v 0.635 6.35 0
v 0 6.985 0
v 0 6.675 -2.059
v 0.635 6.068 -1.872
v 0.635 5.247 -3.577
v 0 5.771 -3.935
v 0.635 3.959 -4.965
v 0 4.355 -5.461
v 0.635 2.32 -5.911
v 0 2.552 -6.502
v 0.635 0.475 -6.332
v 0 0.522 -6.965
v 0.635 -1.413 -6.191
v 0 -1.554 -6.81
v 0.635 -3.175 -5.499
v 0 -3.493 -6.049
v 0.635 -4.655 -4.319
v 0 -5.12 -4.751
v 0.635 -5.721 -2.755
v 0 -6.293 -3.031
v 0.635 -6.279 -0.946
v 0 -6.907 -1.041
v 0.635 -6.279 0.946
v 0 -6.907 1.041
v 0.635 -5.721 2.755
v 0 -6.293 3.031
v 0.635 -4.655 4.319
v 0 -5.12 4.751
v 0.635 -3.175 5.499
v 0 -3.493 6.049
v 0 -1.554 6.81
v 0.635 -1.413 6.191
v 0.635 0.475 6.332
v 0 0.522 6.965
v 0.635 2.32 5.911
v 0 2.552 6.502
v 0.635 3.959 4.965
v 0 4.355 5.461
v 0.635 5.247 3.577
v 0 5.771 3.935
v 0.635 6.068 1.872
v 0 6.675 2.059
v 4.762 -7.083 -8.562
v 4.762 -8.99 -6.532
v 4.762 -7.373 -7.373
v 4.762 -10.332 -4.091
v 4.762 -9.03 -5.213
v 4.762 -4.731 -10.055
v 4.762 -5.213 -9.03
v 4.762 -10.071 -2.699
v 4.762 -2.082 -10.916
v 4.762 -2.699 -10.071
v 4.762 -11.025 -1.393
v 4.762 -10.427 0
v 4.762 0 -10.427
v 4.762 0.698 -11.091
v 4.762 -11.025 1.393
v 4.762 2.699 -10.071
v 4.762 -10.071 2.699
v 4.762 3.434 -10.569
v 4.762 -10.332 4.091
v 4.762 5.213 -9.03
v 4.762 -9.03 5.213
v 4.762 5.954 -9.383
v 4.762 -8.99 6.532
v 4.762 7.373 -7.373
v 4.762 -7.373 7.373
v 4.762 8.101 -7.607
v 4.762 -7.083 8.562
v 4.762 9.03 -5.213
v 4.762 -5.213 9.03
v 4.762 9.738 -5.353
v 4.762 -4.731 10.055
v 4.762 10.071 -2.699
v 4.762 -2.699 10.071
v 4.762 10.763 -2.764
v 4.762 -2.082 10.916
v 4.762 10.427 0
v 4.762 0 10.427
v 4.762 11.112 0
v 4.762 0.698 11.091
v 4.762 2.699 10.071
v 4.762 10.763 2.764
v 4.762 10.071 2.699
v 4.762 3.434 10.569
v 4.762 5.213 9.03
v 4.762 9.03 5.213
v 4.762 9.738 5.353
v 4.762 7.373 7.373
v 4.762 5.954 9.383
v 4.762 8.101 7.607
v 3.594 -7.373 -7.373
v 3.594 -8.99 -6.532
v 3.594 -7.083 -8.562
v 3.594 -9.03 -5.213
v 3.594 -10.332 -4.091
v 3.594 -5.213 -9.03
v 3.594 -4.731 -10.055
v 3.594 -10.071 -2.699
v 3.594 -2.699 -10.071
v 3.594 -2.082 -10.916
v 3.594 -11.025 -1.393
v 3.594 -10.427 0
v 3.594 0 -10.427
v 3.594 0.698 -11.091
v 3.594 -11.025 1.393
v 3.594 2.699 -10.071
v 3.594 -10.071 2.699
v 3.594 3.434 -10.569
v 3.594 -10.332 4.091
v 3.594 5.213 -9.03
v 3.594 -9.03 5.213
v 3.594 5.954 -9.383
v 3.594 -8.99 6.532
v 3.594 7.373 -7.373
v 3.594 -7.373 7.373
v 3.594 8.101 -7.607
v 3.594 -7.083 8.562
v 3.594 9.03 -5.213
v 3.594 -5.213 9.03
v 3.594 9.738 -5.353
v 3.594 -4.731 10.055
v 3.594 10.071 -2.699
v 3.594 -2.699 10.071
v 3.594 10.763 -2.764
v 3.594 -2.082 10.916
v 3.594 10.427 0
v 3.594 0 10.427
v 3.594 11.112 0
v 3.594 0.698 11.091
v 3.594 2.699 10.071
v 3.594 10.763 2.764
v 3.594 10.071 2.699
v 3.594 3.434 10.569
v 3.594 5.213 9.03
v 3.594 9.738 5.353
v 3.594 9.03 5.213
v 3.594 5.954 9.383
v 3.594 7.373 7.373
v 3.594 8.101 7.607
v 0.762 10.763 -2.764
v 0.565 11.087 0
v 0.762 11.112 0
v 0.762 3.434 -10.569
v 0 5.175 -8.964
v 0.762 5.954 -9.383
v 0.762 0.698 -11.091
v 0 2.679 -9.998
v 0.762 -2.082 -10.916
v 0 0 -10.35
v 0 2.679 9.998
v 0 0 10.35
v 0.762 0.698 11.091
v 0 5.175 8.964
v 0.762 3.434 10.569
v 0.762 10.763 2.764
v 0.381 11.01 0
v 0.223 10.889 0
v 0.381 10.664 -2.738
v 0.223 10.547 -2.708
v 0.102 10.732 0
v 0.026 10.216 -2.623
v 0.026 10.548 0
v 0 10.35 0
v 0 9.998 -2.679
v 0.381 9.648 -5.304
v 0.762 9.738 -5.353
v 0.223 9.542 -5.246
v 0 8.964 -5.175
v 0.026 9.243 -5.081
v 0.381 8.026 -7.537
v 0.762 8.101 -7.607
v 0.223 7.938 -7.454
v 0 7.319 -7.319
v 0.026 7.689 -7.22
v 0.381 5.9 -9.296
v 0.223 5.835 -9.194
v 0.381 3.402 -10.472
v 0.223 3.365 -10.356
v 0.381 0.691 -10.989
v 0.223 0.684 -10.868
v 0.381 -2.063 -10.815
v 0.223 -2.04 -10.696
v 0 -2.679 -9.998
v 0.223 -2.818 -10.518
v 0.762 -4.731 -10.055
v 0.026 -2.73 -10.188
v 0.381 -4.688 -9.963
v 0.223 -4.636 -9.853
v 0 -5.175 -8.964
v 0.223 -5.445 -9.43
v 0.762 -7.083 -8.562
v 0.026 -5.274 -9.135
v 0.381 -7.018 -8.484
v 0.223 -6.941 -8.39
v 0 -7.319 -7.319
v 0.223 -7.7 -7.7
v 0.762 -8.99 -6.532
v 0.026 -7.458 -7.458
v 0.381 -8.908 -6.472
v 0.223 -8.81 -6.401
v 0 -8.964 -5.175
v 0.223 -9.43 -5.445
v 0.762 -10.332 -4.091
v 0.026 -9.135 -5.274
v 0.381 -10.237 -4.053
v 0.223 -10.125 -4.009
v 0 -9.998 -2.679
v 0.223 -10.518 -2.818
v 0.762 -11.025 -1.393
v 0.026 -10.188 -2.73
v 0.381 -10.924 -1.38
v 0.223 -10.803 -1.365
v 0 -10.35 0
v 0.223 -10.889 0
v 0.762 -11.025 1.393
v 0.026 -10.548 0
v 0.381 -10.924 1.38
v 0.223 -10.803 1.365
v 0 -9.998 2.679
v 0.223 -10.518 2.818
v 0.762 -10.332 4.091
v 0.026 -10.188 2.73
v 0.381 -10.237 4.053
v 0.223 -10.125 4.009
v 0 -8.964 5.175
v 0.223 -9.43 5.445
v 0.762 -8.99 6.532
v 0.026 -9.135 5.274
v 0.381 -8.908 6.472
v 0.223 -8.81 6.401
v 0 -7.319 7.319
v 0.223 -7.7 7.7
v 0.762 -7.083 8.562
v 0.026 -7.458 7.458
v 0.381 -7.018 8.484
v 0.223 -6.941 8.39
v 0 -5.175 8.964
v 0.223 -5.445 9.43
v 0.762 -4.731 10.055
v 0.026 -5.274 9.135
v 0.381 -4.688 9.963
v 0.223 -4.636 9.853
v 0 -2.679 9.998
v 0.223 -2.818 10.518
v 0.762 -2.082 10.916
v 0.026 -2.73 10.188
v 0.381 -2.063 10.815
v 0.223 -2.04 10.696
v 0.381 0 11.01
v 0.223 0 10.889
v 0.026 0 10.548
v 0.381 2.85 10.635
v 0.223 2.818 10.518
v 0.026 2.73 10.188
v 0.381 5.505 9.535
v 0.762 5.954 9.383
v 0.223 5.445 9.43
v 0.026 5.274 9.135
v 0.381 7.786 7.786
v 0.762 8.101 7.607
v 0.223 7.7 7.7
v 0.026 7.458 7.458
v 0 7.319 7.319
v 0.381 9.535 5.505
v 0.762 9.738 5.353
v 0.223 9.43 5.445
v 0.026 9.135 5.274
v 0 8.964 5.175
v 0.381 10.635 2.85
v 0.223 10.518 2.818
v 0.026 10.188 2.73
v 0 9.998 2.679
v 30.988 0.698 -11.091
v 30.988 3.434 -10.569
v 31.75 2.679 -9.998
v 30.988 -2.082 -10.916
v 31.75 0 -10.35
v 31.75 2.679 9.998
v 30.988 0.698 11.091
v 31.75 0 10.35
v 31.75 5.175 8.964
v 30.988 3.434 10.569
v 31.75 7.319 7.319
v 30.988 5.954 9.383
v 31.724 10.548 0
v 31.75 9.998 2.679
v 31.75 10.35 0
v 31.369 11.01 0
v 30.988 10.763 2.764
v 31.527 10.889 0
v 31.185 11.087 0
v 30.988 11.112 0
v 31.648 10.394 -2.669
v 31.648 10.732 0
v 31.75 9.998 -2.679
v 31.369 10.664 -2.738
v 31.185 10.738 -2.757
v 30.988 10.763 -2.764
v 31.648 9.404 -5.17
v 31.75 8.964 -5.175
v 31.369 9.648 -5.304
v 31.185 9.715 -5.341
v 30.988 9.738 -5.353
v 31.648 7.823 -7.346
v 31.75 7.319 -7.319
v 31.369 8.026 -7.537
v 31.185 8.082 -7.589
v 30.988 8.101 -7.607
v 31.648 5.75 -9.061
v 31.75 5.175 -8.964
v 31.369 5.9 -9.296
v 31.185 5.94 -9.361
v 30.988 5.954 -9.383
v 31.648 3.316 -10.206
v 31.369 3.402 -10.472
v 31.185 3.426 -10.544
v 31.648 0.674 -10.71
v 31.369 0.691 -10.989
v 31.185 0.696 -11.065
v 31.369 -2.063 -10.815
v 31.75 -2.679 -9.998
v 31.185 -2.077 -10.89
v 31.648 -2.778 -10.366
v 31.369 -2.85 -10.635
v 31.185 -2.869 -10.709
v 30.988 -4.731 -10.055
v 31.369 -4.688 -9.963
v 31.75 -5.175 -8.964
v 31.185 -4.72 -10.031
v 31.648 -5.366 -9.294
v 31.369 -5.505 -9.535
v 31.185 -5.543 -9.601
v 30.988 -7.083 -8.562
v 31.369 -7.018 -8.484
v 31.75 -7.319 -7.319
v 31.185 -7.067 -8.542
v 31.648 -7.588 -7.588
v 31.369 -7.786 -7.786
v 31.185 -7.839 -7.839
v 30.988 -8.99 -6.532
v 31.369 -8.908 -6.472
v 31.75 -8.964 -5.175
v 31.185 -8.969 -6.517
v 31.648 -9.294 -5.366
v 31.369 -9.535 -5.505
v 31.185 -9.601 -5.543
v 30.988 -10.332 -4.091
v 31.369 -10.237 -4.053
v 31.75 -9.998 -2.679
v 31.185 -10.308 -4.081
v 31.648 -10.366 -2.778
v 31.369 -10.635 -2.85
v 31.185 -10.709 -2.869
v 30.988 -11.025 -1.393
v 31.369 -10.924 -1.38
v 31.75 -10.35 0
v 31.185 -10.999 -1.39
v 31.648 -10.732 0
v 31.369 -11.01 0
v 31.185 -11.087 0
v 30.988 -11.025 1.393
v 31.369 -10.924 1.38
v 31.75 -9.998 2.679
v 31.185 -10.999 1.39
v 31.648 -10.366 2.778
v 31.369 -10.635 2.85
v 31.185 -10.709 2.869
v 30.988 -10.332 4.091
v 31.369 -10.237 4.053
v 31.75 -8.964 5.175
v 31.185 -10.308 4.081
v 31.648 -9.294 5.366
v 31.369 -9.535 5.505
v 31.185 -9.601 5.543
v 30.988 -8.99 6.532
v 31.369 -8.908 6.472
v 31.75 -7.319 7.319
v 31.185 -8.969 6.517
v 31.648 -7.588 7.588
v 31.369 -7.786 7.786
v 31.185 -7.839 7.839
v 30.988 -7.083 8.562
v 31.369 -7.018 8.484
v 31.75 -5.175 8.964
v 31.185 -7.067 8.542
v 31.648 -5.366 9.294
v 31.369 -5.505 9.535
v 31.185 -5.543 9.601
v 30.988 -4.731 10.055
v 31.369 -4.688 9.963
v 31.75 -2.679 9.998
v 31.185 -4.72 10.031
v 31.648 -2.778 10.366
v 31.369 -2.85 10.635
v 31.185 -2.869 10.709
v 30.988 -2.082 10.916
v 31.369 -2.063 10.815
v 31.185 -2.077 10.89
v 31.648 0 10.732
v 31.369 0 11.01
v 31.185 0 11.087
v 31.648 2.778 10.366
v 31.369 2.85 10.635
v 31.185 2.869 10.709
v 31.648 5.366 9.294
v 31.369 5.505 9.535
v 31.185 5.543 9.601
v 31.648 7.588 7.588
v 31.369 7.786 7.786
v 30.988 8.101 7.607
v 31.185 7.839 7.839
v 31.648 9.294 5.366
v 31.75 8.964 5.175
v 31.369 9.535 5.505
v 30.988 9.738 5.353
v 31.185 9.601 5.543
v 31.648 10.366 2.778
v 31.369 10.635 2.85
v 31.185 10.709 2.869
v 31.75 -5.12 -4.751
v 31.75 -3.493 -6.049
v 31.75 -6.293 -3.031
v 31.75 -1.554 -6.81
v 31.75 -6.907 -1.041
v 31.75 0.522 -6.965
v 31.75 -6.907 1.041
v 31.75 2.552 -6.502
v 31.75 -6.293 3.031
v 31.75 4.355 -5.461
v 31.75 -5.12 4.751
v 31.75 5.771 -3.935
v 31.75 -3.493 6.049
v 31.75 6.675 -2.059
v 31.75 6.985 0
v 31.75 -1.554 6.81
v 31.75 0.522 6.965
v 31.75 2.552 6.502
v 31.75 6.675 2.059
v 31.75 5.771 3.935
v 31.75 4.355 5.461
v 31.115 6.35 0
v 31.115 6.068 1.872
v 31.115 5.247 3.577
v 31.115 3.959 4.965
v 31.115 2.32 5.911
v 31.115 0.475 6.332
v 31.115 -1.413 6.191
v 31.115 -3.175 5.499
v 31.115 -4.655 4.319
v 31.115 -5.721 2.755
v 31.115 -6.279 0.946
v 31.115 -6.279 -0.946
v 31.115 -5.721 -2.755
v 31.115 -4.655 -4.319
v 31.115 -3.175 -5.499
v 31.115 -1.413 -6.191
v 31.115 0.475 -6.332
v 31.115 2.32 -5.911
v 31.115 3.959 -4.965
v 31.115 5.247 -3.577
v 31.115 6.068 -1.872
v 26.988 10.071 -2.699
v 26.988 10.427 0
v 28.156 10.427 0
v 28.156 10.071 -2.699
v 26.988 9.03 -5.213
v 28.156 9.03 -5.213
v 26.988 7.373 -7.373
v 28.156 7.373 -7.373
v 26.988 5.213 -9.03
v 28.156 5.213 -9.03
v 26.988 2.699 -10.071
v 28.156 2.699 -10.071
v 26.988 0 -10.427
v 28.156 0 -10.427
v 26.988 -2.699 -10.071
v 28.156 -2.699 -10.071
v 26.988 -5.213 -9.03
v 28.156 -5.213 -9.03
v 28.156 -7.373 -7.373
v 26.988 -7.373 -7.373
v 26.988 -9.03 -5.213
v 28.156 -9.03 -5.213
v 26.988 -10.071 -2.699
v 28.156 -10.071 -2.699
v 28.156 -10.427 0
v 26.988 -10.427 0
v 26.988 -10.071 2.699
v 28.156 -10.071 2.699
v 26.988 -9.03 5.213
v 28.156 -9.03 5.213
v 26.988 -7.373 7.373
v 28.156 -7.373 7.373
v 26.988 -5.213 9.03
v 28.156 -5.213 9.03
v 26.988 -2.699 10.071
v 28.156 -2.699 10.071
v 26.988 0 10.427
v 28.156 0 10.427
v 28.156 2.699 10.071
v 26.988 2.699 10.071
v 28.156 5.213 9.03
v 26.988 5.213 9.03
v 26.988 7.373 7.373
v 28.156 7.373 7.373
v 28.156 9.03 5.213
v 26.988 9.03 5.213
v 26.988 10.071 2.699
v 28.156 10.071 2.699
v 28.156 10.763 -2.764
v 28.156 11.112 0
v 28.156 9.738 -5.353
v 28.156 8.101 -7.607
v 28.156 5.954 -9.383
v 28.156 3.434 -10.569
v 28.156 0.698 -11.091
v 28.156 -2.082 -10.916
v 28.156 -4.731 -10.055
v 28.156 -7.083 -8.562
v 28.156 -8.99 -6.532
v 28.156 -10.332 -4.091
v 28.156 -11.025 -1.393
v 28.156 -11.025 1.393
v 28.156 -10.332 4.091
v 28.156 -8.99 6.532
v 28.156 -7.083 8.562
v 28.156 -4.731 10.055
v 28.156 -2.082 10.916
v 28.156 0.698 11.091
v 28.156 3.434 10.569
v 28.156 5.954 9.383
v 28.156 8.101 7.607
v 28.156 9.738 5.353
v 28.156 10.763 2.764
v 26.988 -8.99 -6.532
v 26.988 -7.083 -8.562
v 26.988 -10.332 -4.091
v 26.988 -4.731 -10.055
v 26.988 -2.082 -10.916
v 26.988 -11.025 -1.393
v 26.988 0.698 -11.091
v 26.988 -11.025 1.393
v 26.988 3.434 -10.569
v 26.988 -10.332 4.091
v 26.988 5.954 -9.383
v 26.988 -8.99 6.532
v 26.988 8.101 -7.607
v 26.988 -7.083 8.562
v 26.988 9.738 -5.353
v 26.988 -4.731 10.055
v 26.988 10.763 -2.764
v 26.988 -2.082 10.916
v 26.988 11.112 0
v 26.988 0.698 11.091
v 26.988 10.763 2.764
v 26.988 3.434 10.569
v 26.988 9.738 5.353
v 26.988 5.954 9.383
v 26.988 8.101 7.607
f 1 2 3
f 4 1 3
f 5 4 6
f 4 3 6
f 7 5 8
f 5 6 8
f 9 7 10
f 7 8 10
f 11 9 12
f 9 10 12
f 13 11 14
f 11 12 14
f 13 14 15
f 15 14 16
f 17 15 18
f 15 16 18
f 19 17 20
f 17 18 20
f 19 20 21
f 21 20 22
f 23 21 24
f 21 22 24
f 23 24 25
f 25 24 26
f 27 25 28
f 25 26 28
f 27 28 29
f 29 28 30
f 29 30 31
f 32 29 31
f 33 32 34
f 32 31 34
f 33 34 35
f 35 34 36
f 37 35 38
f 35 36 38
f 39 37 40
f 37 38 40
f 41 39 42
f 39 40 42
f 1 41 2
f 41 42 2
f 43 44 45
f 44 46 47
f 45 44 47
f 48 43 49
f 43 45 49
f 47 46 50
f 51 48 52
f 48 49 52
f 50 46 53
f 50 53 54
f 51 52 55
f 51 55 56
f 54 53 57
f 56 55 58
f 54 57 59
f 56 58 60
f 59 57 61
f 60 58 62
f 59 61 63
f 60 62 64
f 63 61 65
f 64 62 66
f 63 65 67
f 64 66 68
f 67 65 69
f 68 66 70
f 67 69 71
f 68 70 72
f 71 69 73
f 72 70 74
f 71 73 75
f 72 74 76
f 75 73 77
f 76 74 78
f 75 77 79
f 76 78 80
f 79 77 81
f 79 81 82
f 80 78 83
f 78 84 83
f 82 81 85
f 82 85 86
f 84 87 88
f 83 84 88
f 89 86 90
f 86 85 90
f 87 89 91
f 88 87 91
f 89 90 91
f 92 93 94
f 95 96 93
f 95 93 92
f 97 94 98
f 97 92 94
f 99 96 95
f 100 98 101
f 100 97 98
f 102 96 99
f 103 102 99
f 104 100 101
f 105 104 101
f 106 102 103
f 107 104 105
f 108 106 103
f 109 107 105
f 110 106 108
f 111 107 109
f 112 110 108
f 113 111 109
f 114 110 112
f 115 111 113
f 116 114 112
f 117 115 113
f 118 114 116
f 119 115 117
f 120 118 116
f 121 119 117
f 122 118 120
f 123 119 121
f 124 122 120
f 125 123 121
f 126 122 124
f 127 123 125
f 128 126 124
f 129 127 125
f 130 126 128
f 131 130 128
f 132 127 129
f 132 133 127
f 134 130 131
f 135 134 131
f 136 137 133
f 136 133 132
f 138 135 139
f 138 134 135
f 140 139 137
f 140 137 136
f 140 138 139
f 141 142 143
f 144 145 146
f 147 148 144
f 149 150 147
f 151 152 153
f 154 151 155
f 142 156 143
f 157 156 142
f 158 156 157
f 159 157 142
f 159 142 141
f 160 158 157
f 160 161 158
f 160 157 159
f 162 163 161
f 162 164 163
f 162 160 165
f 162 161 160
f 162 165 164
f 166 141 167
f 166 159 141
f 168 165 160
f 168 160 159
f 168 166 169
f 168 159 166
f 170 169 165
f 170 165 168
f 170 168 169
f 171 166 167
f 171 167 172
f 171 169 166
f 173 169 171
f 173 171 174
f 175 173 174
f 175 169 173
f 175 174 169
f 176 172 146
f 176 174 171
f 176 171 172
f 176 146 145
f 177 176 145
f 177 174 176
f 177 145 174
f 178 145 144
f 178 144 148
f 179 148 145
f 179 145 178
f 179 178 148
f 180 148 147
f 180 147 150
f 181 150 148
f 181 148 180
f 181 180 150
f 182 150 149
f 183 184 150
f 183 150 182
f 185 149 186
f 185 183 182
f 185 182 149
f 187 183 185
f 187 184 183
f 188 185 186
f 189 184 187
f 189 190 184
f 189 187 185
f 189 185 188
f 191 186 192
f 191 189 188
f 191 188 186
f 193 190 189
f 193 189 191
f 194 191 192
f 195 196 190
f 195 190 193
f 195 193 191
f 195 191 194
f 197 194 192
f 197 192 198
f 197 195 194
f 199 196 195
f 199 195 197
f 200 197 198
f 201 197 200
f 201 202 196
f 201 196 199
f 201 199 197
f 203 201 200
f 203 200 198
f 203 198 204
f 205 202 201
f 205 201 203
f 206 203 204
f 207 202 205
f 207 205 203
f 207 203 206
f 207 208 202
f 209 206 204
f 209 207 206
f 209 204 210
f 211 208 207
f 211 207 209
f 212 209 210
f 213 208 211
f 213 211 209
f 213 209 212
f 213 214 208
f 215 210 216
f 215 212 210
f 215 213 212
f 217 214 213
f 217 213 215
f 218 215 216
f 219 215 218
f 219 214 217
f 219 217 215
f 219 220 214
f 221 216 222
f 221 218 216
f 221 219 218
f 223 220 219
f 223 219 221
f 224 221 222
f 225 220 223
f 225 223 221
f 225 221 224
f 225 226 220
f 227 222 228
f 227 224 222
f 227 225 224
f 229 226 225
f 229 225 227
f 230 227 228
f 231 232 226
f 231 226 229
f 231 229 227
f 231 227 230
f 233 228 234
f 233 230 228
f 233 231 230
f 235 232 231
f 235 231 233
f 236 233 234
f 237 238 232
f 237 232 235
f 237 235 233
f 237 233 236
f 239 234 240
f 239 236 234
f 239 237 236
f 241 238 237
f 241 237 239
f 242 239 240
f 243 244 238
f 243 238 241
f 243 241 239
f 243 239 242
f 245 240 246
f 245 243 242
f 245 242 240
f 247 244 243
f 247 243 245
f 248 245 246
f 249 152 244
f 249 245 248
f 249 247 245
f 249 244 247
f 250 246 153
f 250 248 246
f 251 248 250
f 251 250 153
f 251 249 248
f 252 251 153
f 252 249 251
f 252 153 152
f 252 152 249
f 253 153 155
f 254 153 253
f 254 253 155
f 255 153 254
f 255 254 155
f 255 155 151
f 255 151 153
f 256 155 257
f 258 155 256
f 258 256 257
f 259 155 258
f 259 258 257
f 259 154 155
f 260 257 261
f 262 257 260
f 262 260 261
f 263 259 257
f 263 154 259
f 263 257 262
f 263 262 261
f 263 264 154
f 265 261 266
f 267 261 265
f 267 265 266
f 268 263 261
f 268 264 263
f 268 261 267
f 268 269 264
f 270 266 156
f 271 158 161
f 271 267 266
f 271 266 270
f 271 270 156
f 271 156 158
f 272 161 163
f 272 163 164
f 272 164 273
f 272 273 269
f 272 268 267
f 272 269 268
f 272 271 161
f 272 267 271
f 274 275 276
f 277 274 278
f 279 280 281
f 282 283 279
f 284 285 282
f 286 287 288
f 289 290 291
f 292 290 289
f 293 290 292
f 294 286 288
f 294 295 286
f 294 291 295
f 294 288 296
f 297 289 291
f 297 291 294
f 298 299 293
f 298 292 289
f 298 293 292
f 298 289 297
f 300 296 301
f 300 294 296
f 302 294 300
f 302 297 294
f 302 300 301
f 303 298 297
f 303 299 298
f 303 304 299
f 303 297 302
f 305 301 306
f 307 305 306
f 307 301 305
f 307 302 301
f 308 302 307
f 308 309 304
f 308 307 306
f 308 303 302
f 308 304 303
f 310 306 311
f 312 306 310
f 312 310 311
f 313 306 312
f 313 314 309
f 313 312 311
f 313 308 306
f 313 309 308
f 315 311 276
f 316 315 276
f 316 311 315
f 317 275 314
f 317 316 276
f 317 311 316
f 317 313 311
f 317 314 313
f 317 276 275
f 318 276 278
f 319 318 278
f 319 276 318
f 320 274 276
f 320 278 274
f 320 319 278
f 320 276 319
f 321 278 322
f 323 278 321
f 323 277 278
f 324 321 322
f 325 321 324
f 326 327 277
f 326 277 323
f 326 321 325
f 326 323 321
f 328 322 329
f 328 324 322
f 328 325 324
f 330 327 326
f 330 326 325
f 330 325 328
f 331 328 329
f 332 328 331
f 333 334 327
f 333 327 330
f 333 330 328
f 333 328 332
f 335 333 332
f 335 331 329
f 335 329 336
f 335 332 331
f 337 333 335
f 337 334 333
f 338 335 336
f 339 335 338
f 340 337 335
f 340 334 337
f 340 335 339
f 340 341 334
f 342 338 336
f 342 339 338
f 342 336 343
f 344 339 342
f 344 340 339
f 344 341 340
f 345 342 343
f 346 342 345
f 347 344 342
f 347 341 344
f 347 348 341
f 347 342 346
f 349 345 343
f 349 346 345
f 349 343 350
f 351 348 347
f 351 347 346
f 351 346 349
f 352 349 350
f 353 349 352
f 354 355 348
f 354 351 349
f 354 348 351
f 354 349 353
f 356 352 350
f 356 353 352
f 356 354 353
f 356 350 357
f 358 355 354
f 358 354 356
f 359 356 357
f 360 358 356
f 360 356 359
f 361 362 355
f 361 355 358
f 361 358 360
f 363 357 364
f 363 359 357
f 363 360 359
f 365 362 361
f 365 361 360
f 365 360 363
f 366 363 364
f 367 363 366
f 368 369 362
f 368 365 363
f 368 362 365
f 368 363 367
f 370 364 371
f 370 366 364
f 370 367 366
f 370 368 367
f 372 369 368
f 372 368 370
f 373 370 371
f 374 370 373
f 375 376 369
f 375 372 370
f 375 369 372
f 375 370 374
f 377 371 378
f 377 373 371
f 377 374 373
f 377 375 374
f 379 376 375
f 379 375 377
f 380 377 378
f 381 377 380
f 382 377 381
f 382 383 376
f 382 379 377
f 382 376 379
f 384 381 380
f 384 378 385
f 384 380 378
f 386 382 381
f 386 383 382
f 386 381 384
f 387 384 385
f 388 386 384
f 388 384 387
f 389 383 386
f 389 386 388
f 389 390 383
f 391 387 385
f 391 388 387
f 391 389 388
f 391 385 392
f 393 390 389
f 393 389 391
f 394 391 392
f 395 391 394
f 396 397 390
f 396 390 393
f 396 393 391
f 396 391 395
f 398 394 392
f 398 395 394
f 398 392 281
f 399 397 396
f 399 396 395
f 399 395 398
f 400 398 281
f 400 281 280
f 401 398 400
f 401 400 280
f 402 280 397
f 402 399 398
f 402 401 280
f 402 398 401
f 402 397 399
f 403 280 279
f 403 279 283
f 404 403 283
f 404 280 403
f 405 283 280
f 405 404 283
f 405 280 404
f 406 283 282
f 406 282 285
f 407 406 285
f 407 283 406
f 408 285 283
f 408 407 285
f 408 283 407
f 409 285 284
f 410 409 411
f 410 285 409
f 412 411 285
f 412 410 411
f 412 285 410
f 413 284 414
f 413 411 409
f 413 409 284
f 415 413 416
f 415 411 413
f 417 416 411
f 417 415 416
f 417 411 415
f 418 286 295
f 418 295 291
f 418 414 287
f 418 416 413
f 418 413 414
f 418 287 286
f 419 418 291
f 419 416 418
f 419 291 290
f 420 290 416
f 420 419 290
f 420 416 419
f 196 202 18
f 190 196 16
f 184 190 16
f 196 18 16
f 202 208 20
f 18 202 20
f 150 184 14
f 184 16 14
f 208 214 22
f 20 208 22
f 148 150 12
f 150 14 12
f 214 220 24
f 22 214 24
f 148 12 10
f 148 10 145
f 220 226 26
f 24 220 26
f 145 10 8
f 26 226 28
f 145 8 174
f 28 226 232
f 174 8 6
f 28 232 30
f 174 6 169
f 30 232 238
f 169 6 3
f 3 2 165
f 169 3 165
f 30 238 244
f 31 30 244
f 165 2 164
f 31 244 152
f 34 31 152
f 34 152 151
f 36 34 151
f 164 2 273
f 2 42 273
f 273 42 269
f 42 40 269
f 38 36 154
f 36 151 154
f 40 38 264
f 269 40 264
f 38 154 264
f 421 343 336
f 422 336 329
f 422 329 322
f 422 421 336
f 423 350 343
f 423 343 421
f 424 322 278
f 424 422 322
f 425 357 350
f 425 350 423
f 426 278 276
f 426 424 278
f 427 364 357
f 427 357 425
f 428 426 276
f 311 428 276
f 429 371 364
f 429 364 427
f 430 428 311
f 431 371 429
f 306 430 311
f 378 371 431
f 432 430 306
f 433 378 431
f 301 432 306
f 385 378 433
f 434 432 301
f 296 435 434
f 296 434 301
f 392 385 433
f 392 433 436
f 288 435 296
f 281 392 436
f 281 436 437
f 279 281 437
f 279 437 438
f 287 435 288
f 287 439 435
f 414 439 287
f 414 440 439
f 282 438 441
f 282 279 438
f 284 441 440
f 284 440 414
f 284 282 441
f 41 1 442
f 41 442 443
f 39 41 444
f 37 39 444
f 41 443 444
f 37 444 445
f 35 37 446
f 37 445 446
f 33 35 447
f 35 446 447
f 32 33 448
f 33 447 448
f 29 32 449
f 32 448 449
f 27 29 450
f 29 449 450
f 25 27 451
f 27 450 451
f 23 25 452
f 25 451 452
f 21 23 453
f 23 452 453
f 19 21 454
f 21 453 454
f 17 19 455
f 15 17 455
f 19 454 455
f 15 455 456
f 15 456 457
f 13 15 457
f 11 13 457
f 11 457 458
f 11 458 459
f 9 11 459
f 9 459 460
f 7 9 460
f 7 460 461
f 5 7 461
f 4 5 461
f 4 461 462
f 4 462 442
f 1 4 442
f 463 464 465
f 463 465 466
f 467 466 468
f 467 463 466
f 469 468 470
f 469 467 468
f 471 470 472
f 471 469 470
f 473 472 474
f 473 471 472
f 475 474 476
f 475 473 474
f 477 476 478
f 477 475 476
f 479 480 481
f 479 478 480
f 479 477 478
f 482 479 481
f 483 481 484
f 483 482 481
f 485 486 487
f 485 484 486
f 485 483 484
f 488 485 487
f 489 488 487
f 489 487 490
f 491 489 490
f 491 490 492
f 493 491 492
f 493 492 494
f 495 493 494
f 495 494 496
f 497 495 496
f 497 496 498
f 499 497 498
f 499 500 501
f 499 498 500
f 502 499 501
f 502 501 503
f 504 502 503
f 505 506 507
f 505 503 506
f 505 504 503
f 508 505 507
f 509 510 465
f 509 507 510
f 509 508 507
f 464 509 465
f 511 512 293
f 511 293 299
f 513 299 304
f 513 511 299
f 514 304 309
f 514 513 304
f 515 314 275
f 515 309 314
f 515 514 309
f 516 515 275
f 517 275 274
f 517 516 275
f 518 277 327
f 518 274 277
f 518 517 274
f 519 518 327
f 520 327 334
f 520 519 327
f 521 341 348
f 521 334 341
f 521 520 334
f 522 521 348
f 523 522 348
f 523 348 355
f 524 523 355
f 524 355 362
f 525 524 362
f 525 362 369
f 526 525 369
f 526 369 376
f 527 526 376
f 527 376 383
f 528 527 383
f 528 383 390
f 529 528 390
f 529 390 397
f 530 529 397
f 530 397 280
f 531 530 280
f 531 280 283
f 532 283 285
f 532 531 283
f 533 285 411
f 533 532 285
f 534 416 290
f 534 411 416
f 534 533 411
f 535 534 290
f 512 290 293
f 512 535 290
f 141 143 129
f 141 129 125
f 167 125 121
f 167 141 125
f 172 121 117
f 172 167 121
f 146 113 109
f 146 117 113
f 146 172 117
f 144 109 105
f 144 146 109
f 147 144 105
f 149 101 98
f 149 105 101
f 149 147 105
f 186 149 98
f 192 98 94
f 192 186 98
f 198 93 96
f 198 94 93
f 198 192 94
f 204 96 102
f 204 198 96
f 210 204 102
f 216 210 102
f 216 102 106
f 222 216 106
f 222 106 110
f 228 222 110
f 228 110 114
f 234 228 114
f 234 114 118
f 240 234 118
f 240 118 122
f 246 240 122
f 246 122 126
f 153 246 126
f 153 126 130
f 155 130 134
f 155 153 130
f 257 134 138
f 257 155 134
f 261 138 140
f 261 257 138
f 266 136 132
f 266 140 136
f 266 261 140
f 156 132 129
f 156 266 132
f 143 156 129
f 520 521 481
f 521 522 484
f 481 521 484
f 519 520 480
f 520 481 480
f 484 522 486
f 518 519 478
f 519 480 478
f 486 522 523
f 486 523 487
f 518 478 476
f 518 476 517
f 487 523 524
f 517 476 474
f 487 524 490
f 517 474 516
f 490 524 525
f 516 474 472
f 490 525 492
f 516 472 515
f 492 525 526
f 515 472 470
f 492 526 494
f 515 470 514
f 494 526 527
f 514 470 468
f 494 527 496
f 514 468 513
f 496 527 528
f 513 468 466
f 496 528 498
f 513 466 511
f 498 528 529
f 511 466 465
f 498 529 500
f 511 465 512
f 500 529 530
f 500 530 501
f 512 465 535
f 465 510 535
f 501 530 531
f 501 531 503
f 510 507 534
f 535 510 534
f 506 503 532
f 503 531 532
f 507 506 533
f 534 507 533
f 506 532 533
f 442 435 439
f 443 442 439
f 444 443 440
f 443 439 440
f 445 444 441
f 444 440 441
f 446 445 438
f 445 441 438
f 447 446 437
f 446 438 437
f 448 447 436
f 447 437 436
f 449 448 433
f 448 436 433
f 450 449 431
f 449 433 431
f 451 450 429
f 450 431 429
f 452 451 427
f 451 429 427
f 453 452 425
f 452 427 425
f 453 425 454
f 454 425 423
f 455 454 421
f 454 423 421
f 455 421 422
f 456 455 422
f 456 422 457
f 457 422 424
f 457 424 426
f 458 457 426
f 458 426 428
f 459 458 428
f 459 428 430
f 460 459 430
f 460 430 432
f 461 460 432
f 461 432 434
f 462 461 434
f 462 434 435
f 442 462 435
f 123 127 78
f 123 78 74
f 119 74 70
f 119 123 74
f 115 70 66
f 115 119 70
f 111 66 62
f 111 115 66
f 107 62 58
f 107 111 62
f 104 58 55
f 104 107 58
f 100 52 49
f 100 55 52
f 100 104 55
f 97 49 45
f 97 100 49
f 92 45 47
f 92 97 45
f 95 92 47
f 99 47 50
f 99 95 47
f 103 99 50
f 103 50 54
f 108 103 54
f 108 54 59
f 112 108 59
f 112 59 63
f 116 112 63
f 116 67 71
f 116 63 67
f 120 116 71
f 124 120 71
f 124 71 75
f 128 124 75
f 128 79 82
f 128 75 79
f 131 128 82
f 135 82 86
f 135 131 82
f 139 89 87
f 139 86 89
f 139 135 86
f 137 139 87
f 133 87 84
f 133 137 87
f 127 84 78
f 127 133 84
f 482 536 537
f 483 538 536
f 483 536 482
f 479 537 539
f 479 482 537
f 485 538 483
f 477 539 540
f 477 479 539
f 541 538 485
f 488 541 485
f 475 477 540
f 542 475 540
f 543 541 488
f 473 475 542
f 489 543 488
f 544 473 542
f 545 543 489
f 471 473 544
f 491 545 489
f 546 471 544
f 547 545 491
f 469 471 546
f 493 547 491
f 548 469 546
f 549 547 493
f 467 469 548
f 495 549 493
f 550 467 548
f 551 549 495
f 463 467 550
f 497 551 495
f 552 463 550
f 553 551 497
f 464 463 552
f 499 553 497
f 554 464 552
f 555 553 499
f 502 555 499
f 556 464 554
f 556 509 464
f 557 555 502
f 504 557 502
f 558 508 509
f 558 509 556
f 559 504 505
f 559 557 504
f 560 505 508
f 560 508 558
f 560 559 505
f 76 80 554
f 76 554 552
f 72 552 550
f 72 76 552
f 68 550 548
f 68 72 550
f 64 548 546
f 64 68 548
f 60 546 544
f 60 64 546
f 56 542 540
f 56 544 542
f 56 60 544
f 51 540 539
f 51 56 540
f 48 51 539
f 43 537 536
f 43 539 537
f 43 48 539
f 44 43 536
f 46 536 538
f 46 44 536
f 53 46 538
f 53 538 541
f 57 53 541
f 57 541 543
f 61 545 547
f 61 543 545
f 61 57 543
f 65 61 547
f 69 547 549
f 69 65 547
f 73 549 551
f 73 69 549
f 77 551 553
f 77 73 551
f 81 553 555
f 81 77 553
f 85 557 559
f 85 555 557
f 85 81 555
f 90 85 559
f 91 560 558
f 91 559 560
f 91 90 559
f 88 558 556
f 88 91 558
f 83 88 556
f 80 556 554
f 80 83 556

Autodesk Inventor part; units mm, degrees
ref_plane "YZ Plane" through (0, 0, 0) normal (1, 0, 0) x (0, 1, 0)
ref_plane "XZ Plane" through (0, 0, 0) normal (0, 1, 0) x (-1, 0, 0)
ref_plane "XY Plane" through (0, 0, 0) normal (0, 0, 1) x (1, 0, 0)
sketch "Sketch_1" plane through (0, 0, 0) normal (0, 0, 1) x (1, 0, 0)
  line L0 (31.75, 0) -> (0, 0)
  line L1 (0, 6.985) -> (0.635, 6.35)
  line L2 (0.635, 6.35) -> (31.115, 6.35)
  line L3 (31.115, 6.35) -> (31.75, 6.985)
  line L4 (31.75, 6.985) -> (31.75, 10.3505)
  arc A0 (31.75, 10.3505) -> (30.988, 11.1125) centre (30.988, 10.3505) ccw
  line L5 (30.988, 11.1125) -> (28.1559, 11.1125)
  line L6 (28.1559, 11.1125) -> (28.1559, 10.4267)
  line L7 (28.1559, 10.4267) -> (26.9875, 10.4267)
  line L8 (26.9875, 10.4267) -> (26.9875, 11.1125)
  line L9 (26.9875, 11.1125) -> (4.7625, 11.1125)
  line L10 (4.7625, 11.1125) -> (4.7625, 10.4267)
  line L11 (4.7625, 10.4267) -> (3.5941, 10.4267)
  line L12 (3.5941, 10.4267) -> (3.5941, 11.1125)
  line L13 (3.5941, 11.1125) -> (0.762, 11.1125)
  arc A1 (0.762, 11.1125) -> (0, 10.3505) centre (0.762, 10.3505) ccw
  line L14 (0, 10.3505) -> (0, 6.985)
revolve "Revolution1" add sketch "Sketch_1" angle 360 about axis through (31.75, 0, 0) along (1, 0, 0)
properties part number "U-LMU0 50"
